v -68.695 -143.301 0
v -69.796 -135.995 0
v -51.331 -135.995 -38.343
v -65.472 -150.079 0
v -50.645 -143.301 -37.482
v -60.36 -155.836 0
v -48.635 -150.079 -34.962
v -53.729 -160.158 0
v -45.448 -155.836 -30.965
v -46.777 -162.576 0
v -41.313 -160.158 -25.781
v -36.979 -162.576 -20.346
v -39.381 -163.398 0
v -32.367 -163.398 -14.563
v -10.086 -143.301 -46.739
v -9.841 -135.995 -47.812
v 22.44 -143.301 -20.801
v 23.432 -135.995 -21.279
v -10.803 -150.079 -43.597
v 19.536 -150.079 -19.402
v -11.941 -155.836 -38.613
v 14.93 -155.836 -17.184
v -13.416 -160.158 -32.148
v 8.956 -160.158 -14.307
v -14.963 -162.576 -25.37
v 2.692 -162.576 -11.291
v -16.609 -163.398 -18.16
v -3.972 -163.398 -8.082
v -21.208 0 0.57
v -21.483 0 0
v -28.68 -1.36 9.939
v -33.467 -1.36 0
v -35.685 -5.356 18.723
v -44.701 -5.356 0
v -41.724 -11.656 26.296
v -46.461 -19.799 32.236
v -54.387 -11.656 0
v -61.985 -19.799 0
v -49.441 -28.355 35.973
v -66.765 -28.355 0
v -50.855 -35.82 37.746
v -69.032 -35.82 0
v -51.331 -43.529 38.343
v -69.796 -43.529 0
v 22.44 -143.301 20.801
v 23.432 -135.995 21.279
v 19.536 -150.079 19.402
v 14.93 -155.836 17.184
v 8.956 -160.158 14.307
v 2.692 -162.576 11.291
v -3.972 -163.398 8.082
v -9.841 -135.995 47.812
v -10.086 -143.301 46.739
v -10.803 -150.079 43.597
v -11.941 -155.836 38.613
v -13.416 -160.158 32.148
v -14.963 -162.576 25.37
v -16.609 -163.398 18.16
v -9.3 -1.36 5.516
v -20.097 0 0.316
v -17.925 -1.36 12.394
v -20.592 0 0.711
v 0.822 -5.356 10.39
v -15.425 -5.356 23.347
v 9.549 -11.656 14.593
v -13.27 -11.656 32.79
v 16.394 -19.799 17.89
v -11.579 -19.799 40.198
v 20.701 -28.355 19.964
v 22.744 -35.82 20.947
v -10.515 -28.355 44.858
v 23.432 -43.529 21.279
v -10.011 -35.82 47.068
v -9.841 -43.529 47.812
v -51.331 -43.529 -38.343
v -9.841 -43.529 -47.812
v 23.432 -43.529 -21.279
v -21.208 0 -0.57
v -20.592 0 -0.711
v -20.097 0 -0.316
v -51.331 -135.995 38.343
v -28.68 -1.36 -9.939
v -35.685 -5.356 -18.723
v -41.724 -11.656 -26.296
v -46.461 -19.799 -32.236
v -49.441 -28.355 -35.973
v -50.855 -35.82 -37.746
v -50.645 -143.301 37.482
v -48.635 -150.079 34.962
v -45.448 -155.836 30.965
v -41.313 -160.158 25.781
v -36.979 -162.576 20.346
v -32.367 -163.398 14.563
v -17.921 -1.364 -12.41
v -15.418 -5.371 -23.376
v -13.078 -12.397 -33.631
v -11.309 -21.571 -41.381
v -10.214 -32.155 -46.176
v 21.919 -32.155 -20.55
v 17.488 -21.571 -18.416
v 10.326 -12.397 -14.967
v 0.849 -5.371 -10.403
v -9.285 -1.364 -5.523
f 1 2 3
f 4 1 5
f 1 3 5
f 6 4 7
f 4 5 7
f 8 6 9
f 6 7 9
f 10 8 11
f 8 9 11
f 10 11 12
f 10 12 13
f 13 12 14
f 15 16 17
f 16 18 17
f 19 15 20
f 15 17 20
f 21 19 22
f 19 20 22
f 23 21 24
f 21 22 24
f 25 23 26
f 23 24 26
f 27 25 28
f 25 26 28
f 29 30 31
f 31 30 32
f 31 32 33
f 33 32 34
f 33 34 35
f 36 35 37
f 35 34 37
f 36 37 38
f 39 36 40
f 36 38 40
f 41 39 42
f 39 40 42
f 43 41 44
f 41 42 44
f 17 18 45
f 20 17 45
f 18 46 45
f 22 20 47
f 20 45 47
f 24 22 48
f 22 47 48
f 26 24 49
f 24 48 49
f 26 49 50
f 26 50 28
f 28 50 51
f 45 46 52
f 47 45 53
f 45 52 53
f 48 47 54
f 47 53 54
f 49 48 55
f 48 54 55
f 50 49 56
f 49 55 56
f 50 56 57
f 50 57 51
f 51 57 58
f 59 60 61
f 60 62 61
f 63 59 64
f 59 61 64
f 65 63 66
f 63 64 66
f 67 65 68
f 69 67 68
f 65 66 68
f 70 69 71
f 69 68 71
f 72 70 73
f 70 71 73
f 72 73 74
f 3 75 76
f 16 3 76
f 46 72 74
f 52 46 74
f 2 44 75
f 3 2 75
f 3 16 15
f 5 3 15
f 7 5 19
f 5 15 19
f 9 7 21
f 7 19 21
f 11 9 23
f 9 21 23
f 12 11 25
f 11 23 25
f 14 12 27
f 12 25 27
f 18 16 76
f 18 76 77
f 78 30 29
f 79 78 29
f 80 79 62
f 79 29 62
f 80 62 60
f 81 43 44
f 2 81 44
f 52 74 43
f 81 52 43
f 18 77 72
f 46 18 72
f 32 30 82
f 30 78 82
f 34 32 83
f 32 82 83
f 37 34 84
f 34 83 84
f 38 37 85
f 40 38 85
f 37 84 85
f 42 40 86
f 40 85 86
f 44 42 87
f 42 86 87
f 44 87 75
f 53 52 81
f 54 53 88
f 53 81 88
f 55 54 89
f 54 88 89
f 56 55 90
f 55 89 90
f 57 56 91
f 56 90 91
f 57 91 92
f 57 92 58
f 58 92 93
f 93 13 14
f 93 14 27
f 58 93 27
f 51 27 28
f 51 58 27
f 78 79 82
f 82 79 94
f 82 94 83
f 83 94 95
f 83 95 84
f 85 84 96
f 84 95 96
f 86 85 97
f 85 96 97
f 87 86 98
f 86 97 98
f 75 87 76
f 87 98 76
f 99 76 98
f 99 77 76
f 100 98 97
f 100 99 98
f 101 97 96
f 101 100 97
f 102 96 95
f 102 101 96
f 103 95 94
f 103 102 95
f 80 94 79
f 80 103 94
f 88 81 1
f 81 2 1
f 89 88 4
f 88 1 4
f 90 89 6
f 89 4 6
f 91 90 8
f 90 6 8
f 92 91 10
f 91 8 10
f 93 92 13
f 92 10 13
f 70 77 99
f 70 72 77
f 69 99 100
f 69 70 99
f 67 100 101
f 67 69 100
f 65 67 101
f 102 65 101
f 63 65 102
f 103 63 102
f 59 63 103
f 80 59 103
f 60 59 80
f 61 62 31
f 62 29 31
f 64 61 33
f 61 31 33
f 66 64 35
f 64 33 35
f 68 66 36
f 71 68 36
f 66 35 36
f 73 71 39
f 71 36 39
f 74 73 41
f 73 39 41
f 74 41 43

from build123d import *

# Parameters (mm, degrees)
F1_DEPTH = 163.398445
F2_R     = 27.403209
F3_R     = 43.528601


with BuildPart() as f1:
    # F0 (on Front) → F1 (new body)
    with BuildSketch(Plane.XZ):
        Polygon((23.431614, -21.278546), (23.431614, 21.278546), (-9.84086, 47.812458), (-51.330956, 38.342614), (-69.795786, 0), (-51.330956, -38.342614), (-9.84086, -47.812458), align=None)
    extrude(amount=F1_DEPTH)

    # F2
    f2_edges = [f1.edges().sort_by_distance(p)[0] for p in [
        (-30.585908, -163.398445, 43.077536),
        (-60.563371, -163.398445, 19.171307),
        (-60.563371, -163.398445, -19.171307),
        (-30.585908, -163.398445, -43.077536),
        (6.795377, -163.398445, 34.545502),
        (23.431614, -163.398445, 0),
        (6.795377, -163.398445, -34.545502),
    ]]
    fillet(f2_edges, radius=F2_R)

    # F3
    f3_edges = [f1.edges().sort_by_distance(p)[0] for p in [
        (-30.585908, 0, 43.077536),
        (6.795377, 0, 34.545502),
        (23.431614, 0, 0),
        (6.795377, 0, -34.545502),
        (-30.585908, 0, -43.077536),
        (-60.563371, 0, 19.171307),
        (-60.563371, 0, -19.171307),
    ]]
    fillet(f3_edges, radius=F3_R)


solid = f1.part
